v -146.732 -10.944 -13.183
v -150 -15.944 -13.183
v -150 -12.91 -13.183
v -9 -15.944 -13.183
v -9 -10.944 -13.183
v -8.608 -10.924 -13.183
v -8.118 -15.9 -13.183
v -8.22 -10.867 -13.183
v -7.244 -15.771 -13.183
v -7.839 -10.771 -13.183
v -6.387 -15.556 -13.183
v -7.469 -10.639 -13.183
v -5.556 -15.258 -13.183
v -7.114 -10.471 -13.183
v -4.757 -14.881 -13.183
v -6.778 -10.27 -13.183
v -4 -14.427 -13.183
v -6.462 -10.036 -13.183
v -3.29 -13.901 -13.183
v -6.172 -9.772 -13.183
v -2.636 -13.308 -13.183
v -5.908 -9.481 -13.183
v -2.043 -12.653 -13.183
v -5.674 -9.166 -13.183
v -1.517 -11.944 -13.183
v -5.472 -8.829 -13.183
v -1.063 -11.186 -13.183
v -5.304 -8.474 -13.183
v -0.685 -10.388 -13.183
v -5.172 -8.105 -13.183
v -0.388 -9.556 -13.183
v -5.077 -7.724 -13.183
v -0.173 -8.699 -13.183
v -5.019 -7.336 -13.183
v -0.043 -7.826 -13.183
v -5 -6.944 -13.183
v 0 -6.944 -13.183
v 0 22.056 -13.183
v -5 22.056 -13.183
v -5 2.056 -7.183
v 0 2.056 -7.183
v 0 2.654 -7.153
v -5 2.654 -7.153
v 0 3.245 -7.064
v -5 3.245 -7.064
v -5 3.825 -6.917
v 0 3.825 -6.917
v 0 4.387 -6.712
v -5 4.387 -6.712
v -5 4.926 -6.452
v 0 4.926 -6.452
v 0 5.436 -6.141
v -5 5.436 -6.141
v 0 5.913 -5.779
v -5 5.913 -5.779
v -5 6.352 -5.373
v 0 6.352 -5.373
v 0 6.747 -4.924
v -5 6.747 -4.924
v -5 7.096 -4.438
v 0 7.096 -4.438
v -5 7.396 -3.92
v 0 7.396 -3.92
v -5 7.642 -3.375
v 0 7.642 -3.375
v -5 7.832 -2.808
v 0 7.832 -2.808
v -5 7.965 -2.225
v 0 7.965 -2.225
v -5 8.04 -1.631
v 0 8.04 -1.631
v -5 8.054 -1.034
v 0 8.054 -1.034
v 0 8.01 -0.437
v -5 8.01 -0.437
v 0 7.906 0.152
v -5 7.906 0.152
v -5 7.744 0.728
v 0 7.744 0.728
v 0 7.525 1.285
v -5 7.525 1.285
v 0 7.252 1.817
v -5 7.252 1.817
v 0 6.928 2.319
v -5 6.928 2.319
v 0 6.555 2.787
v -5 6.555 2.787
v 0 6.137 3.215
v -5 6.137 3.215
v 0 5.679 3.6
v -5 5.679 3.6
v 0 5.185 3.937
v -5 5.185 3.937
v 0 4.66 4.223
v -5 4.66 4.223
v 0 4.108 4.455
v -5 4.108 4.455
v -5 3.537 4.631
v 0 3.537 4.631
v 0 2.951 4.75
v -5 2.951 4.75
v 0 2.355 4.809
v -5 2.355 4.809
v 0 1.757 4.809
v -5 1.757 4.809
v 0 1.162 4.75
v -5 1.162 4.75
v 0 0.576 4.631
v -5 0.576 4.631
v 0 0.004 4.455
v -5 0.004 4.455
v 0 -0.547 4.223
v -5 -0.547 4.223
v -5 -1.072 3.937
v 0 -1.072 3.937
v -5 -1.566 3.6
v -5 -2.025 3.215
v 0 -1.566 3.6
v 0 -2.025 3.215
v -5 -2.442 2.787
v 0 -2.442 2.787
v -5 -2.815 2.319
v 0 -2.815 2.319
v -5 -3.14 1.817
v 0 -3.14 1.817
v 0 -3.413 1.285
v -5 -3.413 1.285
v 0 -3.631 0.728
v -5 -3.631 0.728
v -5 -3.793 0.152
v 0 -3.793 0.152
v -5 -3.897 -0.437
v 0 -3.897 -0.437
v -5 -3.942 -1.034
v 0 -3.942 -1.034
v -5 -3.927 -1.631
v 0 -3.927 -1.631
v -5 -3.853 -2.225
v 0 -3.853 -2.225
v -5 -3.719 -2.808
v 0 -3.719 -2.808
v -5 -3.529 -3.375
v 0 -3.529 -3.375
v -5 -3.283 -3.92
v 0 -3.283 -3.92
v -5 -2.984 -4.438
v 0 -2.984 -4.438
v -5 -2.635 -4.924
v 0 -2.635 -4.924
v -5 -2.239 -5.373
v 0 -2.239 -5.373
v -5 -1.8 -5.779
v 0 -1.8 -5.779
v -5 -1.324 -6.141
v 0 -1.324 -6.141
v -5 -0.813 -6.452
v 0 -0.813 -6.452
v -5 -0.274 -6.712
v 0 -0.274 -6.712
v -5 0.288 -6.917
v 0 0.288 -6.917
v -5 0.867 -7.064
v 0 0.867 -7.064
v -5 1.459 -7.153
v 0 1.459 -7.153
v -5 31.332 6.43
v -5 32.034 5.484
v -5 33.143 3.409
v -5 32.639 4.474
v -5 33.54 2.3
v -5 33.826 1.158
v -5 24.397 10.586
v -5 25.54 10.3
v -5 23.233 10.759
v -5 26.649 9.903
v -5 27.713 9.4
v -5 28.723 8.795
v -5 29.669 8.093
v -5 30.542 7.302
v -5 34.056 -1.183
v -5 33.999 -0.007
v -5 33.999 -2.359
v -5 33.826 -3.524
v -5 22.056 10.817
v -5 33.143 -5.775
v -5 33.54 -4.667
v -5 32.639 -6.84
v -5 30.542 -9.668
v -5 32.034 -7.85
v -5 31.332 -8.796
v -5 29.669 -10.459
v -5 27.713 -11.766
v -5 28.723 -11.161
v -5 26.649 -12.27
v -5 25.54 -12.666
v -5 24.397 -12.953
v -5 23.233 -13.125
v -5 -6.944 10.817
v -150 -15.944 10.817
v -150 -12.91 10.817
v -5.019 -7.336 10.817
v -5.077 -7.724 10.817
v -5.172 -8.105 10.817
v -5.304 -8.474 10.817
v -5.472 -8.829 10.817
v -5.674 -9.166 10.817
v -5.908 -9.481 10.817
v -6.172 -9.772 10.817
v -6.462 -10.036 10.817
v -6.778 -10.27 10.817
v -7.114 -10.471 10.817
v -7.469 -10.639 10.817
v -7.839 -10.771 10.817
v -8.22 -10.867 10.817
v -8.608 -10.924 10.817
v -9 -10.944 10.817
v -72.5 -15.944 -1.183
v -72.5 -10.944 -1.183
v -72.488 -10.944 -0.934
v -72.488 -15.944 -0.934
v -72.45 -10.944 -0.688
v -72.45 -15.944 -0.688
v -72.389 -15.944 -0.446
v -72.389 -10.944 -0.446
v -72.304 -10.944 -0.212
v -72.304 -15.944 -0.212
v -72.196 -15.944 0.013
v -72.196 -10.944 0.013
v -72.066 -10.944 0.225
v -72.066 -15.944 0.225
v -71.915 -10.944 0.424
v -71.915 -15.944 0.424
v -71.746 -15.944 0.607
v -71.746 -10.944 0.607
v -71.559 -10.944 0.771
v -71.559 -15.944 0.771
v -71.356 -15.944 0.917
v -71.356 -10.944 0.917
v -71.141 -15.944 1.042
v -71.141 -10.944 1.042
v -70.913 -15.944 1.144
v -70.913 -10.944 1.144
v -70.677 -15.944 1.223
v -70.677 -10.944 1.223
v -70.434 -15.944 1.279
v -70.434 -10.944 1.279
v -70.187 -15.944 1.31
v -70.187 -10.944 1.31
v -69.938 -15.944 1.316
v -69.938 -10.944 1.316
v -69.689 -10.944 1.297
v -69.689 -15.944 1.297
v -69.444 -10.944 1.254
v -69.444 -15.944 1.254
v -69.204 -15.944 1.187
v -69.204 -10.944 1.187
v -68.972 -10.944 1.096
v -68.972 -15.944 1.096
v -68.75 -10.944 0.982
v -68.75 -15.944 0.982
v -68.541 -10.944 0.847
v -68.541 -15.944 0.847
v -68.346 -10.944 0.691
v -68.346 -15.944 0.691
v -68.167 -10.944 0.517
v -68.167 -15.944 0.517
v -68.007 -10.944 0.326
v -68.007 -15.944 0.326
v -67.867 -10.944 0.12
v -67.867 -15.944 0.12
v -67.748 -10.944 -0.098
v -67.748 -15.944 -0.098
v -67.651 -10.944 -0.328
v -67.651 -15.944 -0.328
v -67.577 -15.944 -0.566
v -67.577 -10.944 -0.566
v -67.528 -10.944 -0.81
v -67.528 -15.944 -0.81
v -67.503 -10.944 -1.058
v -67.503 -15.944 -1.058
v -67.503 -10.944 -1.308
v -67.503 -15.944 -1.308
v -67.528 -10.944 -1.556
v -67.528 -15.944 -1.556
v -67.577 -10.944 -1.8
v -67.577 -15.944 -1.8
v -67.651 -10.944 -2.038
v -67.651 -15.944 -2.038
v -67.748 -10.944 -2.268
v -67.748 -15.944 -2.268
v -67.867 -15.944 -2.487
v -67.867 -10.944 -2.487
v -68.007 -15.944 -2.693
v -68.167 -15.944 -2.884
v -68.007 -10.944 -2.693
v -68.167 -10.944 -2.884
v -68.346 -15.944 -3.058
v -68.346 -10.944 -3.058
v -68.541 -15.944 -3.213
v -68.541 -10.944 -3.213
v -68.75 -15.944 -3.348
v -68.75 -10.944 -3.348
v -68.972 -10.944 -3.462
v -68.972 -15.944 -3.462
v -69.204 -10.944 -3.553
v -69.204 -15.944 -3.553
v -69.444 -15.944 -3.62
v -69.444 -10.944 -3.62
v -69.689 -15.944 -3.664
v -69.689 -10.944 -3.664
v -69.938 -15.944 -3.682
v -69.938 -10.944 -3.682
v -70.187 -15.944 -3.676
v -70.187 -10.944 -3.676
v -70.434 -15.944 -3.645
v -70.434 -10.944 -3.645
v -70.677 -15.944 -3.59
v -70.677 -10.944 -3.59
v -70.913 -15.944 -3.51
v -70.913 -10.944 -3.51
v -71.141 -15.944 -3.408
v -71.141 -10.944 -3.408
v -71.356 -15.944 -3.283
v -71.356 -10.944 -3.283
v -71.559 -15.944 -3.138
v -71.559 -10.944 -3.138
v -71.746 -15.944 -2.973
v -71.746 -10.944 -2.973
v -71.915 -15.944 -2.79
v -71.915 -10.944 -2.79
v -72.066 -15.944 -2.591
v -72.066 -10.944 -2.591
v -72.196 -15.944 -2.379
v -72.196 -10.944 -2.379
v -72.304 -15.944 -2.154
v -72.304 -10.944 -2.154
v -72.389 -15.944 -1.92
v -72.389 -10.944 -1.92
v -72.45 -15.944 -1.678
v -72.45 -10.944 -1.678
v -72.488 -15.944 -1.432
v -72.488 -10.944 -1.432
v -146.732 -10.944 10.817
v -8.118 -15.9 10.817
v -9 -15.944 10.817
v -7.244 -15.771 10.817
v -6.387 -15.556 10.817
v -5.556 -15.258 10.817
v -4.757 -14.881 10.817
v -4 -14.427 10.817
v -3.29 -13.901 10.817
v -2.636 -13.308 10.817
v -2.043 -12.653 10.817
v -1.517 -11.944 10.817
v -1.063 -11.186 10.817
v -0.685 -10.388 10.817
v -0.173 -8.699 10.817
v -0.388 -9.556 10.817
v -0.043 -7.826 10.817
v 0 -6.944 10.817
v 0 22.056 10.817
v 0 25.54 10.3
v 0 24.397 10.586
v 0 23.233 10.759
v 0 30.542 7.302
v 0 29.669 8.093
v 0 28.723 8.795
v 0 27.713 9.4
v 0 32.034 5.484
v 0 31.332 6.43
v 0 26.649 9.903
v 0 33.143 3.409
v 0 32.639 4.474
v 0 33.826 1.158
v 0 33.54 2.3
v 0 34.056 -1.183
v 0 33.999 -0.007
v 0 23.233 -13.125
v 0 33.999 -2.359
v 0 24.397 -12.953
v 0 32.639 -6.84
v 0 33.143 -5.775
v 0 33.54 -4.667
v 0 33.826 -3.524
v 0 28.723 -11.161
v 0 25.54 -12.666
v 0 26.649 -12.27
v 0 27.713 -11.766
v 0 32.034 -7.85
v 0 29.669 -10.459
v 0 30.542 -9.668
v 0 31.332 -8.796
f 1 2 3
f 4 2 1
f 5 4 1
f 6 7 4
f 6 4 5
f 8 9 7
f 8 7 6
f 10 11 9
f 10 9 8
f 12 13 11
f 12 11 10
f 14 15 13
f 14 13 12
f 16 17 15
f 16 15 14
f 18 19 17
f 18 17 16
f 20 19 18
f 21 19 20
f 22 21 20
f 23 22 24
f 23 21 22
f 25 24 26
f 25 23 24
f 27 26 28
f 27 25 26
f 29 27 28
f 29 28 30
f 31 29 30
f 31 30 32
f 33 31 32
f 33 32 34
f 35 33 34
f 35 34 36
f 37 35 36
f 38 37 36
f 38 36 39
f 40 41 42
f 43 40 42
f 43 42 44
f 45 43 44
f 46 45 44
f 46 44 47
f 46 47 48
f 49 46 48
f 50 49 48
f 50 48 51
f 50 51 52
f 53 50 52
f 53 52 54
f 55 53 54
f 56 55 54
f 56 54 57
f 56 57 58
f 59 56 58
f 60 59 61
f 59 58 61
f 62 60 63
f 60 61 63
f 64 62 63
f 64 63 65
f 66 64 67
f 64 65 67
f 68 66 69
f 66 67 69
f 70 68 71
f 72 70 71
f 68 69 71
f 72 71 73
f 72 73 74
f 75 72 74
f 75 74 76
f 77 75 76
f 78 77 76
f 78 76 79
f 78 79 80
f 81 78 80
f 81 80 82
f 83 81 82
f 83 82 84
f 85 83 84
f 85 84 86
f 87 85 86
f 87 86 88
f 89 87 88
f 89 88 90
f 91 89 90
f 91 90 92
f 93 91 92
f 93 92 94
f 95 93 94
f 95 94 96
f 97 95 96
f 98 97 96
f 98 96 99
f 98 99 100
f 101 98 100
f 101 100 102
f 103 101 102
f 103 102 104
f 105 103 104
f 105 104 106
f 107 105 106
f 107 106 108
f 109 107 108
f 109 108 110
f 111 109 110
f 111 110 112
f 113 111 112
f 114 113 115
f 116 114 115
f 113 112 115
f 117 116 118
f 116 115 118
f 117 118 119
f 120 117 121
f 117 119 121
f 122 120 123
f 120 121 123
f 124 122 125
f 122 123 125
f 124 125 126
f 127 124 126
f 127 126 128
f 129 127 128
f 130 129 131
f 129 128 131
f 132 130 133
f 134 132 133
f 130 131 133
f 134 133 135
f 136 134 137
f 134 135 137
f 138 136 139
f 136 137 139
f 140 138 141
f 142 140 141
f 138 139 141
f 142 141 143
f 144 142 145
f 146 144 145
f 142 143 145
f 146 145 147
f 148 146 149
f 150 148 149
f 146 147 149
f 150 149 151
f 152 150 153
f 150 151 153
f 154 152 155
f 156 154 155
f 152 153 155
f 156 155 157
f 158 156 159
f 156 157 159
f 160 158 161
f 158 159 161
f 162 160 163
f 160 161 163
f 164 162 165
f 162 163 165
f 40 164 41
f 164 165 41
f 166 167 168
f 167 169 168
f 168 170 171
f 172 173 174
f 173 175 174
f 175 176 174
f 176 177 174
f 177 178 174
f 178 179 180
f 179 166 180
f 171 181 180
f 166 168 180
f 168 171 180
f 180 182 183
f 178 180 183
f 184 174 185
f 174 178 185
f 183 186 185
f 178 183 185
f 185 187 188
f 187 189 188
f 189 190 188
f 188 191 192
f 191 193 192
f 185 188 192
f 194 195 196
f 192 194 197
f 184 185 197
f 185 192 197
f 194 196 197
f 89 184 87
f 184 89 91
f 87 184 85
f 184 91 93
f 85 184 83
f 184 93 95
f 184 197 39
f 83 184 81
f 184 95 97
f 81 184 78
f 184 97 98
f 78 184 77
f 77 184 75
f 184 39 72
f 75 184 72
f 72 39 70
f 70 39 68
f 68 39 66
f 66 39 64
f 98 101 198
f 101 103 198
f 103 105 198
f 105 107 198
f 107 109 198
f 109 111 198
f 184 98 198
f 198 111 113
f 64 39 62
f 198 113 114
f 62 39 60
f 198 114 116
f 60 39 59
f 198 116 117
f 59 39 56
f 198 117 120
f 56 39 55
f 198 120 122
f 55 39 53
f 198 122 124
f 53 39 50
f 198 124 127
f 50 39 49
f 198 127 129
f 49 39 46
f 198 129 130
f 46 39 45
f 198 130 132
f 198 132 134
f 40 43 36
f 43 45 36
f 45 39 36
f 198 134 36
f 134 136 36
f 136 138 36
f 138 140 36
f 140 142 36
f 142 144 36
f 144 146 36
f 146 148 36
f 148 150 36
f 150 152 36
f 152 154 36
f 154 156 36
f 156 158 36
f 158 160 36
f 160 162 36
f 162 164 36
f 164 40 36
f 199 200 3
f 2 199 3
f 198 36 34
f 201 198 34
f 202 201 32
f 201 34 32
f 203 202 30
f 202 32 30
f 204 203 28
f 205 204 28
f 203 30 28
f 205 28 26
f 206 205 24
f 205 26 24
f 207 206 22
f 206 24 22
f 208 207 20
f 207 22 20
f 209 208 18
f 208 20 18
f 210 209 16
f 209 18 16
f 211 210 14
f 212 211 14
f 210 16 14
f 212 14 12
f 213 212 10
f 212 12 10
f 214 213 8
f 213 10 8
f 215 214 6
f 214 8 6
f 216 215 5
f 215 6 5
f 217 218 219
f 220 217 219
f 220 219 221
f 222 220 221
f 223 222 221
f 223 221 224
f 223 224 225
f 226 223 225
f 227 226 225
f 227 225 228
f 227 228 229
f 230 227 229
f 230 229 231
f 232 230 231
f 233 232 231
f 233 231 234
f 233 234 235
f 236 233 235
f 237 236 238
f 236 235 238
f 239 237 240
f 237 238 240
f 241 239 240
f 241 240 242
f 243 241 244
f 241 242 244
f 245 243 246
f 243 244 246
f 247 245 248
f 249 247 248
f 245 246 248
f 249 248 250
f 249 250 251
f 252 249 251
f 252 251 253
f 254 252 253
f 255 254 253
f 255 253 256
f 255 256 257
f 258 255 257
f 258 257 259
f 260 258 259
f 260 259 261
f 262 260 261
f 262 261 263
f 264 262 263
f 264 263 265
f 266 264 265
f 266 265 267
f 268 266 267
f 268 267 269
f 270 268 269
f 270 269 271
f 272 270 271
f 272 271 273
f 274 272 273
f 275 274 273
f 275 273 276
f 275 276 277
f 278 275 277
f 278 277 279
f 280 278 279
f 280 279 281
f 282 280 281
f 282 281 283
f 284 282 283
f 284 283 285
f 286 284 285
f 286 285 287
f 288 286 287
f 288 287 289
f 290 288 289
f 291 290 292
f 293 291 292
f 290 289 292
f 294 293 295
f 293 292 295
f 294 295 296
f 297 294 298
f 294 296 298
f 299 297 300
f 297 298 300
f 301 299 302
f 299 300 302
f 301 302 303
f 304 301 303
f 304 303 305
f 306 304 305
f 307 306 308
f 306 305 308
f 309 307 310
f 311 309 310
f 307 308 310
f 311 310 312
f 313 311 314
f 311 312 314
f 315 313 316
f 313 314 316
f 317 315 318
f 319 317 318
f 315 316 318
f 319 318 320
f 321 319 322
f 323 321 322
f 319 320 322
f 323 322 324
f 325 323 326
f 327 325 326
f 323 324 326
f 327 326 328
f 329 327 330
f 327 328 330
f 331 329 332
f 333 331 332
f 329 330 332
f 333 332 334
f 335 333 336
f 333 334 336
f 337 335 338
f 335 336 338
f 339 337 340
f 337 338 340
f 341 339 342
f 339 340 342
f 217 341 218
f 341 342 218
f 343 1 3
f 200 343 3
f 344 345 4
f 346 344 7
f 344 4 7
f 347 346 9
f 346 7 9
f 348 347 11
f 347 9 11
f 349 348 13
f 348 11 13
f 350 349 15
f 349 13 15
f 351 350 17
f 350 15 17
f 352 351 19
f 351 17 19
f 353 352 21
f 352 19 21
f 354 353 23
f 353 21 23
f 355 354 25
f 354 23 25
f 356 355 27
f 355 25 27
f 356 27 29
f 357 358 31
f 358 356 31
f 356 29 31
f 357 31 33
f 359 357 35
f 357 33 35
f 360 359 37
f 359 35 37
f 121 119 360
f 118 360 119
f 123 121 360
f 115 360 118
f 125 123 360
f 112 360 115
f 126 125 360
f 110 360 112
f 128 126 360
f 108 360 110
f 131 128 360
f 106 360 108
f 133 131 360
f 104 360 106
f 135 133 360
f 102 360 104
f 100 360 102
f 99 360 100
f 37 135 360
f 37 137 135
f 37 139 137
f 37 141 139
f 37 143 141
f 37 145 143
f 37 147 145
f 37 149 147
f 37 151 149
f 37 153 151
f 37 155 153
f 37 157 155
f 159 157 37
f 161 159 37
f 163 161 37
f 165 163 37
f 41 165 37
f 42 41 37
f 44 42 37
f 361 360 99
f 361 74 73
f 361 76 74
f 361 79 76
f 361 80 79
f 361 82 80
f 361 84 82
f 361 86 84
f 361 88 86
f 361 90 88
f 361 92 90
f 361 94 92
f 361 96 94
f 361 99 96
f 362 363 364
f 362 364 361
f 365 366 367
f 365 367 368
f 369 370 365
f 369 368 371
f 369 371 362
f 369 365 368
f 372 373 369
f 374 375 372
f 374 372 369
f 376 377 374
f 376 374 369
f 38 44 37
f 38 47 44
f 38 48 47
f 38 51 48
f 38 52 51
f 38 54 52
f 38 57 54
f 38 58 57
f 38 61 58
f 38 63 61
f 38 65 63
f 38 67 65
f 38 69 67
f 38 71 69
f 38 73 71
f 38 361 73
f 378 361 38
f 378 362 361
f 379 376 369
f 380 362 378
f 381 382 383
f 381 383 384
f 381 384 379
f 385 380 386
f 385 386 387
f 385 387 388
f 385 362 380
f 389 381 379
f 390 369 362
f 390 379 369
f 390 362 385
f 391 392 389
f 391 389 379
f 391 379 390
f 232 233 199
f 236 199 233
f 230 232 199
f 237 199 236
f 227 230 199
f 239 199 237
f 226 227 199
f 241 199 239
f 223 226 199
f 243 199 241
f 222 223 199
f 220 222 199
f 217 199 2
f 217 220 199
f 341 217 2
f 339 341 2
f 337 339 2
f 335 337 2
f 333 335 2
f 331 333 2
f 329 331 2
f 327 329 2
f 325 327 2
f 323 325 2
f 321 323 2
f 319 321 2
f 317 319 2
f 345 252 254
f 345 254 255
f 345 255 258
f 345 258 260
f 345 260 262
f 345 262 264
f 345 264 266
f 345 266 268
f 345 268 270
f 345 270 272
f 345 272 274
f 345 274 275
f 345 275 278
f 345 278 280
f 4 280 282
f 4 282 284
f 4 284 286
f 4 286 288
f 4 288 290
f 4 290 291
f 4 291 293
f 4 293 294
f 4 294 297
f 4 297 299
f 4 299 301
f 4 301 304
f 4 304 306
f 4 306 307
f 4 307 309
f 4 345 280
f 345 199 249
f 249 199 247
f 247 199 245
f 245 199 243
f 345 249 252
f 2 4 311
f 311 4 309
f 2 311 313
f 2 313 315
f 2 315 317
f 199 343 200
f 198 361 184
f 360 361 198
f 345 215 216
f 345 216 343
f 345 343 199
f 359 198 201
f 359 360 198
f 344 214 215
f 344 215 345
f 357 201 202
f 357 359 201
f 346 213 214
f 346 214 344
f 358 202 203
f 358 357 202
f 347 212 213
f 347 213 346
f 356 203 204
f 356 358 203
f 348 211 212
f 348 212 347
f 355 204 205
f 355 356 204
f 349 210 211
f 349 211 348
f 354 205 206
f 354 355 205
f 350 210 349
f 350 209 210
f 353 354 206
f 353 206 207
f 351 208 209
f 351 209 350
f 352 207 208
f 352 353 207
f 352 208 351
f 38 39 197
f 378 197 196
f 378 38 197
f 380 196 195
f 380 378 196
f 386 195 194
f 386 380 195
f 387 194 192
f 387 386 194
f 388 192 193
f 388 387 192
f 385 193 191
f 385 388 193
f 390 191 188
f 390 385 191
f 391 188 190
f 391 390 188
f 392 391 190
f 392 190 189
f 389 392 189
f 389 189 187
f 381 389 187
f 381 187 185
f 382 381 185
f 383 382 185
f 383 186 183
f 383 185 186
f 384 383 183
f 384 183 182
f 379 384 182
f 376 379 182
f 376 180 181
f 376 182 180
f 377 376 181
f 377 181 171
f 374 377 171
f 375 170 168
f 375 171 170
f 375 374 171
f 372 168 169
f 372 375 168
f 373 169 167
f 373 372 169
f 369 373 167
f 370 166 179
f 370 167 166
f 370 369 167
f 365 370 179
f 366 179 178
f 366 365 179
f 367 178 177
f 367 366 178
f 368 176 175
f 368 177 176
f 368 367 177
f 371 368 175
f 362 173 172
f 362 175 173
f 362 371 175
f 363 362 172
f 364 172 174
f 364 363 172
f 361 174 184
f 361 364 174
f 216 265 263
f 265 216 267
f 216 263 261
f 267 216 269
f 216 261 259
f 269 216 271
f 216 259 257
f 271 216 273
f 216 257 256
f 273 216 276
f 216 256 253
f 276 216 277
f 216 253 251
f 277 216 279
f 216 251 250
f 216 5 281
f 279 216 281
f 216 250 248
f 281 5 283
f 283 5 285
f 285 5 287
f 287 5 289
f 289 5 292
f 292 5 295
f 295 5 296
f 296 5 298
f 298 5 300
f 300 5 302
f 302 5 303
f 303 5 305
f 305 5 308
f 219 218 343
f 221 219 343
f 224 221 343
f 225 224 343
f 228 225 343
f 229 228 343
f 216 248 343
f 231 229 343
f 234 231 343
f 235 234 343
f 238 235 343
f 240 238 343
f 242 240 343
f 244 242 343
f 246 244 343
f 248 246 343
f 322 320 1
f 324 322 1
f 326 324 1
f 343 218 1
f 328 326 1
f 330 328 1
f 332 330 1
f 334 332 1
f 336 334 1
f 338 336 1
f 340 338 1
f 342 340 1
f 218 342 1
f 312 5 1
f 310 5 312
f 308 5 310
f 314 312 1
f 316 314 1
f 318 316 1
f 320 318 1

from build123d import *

# Parameters (mm, degrees)
SKETCH1_R           = 6
BOSS_EXTRUDE1_DEPTH = 150
CUT_EXTRUDE1_DEPTH  = 150
CUT_EXTRUDE2_DEPTH  = 150
SKETCH6_R           = 2.5
CUT_EXTRUDE3_DEPTH  = 150


with BuildPart() as part:
    # Sketch1 → Boss-Extrude1 (new body)
    with BuildSketch(Plane(origin=(0, 0, 0), x_dir=(0, 0, -1), z_dir=(1, 0, 0))):
        with BuildLine():
            Line((-10.816901408, 22.056338028), (-10.816901408, -15.943661972))
            Line((-10.816901408, -15.943661972), (13.183098592, -15.943661972))
            Line((13.183098592, -15.943661972), (13.183098592, 22.056338028))
            ThreePointArc((13.183098592, 22.056338028), (1.183098592, 34.056338028), (-10.816901408, 22.056338028))
        make_face()
        with Locations((1.183098592, 2.056338028)):
            Circle(SKETCH1_R, mode=Mode.SUBTRACT)
    extrude(amount=-BOSS_EXTRUDE1_DEPTH)

    # Sketch3 → Cut-Extrude1 (cut)
    with BuildSketch(Plane(origin=(0, 0, -13.183098592), x_dir=(-1, 0, 0), z_dir=(0, 0, -1))):
        with BuildLine():
            Line((5, 34.056338028), (5, -6.943661972))
            ThreePointArc((5, -6.943661972), (6.171572875, -9.772089097), (9, -10.943661972))
            Line((9, -10.943661972), (150, -10.943661972))
            Line((150, -10.943661972), (150, 34.056338028))
            Line((150, 34.056338028), (5, 34.056338028))
        make_face()
    extrude(amount=-CUT_EXTRUDE1_DEPTH, mode=Mode.SUBTRACT)

    # Sketch4 → Cut-Extrude2 (cut)
    with BuildSketch(Plane(origin=(0, 0, -13.183098592), x_dir=(-1, 0, 0), z_dir=(0, 0, -1))):
        Polygon((146.731773505, -10.943661972), (150, -12.910119048), (150, -10.943661972), align=None)
        with BuildLine():
            Line((0, -6.943663252), (0, -15.943661972))
            Line((0, -15.943661972), (8.999719534, -15.943661972))
            ThreePointArc((8.999719534, -15.943661972), (2.635939888, -13.307524671), (0, -6.943663252))
        make_face()
    extrude(amount=-CUT_EXTRUDE2_DEPTH, mode=Mode.SUBTRACT)

    # Sketch6 → Cut-Extrude3 (cut)
    with BuildSketch(Plane(origin=(0, -10.943661972, 0), x_dir=(1, 0, 0), z_dir=(0, 1, 0))):
        with Locations(Location((-70, 1.183098592, 0), (0, 0, 180))):
            Circle(SKETCH6_R)
    extrude(amount=-CUT_EXTRUDE3_DEPTH, mode=Mode.SUBTRACT)


solid = part.part
